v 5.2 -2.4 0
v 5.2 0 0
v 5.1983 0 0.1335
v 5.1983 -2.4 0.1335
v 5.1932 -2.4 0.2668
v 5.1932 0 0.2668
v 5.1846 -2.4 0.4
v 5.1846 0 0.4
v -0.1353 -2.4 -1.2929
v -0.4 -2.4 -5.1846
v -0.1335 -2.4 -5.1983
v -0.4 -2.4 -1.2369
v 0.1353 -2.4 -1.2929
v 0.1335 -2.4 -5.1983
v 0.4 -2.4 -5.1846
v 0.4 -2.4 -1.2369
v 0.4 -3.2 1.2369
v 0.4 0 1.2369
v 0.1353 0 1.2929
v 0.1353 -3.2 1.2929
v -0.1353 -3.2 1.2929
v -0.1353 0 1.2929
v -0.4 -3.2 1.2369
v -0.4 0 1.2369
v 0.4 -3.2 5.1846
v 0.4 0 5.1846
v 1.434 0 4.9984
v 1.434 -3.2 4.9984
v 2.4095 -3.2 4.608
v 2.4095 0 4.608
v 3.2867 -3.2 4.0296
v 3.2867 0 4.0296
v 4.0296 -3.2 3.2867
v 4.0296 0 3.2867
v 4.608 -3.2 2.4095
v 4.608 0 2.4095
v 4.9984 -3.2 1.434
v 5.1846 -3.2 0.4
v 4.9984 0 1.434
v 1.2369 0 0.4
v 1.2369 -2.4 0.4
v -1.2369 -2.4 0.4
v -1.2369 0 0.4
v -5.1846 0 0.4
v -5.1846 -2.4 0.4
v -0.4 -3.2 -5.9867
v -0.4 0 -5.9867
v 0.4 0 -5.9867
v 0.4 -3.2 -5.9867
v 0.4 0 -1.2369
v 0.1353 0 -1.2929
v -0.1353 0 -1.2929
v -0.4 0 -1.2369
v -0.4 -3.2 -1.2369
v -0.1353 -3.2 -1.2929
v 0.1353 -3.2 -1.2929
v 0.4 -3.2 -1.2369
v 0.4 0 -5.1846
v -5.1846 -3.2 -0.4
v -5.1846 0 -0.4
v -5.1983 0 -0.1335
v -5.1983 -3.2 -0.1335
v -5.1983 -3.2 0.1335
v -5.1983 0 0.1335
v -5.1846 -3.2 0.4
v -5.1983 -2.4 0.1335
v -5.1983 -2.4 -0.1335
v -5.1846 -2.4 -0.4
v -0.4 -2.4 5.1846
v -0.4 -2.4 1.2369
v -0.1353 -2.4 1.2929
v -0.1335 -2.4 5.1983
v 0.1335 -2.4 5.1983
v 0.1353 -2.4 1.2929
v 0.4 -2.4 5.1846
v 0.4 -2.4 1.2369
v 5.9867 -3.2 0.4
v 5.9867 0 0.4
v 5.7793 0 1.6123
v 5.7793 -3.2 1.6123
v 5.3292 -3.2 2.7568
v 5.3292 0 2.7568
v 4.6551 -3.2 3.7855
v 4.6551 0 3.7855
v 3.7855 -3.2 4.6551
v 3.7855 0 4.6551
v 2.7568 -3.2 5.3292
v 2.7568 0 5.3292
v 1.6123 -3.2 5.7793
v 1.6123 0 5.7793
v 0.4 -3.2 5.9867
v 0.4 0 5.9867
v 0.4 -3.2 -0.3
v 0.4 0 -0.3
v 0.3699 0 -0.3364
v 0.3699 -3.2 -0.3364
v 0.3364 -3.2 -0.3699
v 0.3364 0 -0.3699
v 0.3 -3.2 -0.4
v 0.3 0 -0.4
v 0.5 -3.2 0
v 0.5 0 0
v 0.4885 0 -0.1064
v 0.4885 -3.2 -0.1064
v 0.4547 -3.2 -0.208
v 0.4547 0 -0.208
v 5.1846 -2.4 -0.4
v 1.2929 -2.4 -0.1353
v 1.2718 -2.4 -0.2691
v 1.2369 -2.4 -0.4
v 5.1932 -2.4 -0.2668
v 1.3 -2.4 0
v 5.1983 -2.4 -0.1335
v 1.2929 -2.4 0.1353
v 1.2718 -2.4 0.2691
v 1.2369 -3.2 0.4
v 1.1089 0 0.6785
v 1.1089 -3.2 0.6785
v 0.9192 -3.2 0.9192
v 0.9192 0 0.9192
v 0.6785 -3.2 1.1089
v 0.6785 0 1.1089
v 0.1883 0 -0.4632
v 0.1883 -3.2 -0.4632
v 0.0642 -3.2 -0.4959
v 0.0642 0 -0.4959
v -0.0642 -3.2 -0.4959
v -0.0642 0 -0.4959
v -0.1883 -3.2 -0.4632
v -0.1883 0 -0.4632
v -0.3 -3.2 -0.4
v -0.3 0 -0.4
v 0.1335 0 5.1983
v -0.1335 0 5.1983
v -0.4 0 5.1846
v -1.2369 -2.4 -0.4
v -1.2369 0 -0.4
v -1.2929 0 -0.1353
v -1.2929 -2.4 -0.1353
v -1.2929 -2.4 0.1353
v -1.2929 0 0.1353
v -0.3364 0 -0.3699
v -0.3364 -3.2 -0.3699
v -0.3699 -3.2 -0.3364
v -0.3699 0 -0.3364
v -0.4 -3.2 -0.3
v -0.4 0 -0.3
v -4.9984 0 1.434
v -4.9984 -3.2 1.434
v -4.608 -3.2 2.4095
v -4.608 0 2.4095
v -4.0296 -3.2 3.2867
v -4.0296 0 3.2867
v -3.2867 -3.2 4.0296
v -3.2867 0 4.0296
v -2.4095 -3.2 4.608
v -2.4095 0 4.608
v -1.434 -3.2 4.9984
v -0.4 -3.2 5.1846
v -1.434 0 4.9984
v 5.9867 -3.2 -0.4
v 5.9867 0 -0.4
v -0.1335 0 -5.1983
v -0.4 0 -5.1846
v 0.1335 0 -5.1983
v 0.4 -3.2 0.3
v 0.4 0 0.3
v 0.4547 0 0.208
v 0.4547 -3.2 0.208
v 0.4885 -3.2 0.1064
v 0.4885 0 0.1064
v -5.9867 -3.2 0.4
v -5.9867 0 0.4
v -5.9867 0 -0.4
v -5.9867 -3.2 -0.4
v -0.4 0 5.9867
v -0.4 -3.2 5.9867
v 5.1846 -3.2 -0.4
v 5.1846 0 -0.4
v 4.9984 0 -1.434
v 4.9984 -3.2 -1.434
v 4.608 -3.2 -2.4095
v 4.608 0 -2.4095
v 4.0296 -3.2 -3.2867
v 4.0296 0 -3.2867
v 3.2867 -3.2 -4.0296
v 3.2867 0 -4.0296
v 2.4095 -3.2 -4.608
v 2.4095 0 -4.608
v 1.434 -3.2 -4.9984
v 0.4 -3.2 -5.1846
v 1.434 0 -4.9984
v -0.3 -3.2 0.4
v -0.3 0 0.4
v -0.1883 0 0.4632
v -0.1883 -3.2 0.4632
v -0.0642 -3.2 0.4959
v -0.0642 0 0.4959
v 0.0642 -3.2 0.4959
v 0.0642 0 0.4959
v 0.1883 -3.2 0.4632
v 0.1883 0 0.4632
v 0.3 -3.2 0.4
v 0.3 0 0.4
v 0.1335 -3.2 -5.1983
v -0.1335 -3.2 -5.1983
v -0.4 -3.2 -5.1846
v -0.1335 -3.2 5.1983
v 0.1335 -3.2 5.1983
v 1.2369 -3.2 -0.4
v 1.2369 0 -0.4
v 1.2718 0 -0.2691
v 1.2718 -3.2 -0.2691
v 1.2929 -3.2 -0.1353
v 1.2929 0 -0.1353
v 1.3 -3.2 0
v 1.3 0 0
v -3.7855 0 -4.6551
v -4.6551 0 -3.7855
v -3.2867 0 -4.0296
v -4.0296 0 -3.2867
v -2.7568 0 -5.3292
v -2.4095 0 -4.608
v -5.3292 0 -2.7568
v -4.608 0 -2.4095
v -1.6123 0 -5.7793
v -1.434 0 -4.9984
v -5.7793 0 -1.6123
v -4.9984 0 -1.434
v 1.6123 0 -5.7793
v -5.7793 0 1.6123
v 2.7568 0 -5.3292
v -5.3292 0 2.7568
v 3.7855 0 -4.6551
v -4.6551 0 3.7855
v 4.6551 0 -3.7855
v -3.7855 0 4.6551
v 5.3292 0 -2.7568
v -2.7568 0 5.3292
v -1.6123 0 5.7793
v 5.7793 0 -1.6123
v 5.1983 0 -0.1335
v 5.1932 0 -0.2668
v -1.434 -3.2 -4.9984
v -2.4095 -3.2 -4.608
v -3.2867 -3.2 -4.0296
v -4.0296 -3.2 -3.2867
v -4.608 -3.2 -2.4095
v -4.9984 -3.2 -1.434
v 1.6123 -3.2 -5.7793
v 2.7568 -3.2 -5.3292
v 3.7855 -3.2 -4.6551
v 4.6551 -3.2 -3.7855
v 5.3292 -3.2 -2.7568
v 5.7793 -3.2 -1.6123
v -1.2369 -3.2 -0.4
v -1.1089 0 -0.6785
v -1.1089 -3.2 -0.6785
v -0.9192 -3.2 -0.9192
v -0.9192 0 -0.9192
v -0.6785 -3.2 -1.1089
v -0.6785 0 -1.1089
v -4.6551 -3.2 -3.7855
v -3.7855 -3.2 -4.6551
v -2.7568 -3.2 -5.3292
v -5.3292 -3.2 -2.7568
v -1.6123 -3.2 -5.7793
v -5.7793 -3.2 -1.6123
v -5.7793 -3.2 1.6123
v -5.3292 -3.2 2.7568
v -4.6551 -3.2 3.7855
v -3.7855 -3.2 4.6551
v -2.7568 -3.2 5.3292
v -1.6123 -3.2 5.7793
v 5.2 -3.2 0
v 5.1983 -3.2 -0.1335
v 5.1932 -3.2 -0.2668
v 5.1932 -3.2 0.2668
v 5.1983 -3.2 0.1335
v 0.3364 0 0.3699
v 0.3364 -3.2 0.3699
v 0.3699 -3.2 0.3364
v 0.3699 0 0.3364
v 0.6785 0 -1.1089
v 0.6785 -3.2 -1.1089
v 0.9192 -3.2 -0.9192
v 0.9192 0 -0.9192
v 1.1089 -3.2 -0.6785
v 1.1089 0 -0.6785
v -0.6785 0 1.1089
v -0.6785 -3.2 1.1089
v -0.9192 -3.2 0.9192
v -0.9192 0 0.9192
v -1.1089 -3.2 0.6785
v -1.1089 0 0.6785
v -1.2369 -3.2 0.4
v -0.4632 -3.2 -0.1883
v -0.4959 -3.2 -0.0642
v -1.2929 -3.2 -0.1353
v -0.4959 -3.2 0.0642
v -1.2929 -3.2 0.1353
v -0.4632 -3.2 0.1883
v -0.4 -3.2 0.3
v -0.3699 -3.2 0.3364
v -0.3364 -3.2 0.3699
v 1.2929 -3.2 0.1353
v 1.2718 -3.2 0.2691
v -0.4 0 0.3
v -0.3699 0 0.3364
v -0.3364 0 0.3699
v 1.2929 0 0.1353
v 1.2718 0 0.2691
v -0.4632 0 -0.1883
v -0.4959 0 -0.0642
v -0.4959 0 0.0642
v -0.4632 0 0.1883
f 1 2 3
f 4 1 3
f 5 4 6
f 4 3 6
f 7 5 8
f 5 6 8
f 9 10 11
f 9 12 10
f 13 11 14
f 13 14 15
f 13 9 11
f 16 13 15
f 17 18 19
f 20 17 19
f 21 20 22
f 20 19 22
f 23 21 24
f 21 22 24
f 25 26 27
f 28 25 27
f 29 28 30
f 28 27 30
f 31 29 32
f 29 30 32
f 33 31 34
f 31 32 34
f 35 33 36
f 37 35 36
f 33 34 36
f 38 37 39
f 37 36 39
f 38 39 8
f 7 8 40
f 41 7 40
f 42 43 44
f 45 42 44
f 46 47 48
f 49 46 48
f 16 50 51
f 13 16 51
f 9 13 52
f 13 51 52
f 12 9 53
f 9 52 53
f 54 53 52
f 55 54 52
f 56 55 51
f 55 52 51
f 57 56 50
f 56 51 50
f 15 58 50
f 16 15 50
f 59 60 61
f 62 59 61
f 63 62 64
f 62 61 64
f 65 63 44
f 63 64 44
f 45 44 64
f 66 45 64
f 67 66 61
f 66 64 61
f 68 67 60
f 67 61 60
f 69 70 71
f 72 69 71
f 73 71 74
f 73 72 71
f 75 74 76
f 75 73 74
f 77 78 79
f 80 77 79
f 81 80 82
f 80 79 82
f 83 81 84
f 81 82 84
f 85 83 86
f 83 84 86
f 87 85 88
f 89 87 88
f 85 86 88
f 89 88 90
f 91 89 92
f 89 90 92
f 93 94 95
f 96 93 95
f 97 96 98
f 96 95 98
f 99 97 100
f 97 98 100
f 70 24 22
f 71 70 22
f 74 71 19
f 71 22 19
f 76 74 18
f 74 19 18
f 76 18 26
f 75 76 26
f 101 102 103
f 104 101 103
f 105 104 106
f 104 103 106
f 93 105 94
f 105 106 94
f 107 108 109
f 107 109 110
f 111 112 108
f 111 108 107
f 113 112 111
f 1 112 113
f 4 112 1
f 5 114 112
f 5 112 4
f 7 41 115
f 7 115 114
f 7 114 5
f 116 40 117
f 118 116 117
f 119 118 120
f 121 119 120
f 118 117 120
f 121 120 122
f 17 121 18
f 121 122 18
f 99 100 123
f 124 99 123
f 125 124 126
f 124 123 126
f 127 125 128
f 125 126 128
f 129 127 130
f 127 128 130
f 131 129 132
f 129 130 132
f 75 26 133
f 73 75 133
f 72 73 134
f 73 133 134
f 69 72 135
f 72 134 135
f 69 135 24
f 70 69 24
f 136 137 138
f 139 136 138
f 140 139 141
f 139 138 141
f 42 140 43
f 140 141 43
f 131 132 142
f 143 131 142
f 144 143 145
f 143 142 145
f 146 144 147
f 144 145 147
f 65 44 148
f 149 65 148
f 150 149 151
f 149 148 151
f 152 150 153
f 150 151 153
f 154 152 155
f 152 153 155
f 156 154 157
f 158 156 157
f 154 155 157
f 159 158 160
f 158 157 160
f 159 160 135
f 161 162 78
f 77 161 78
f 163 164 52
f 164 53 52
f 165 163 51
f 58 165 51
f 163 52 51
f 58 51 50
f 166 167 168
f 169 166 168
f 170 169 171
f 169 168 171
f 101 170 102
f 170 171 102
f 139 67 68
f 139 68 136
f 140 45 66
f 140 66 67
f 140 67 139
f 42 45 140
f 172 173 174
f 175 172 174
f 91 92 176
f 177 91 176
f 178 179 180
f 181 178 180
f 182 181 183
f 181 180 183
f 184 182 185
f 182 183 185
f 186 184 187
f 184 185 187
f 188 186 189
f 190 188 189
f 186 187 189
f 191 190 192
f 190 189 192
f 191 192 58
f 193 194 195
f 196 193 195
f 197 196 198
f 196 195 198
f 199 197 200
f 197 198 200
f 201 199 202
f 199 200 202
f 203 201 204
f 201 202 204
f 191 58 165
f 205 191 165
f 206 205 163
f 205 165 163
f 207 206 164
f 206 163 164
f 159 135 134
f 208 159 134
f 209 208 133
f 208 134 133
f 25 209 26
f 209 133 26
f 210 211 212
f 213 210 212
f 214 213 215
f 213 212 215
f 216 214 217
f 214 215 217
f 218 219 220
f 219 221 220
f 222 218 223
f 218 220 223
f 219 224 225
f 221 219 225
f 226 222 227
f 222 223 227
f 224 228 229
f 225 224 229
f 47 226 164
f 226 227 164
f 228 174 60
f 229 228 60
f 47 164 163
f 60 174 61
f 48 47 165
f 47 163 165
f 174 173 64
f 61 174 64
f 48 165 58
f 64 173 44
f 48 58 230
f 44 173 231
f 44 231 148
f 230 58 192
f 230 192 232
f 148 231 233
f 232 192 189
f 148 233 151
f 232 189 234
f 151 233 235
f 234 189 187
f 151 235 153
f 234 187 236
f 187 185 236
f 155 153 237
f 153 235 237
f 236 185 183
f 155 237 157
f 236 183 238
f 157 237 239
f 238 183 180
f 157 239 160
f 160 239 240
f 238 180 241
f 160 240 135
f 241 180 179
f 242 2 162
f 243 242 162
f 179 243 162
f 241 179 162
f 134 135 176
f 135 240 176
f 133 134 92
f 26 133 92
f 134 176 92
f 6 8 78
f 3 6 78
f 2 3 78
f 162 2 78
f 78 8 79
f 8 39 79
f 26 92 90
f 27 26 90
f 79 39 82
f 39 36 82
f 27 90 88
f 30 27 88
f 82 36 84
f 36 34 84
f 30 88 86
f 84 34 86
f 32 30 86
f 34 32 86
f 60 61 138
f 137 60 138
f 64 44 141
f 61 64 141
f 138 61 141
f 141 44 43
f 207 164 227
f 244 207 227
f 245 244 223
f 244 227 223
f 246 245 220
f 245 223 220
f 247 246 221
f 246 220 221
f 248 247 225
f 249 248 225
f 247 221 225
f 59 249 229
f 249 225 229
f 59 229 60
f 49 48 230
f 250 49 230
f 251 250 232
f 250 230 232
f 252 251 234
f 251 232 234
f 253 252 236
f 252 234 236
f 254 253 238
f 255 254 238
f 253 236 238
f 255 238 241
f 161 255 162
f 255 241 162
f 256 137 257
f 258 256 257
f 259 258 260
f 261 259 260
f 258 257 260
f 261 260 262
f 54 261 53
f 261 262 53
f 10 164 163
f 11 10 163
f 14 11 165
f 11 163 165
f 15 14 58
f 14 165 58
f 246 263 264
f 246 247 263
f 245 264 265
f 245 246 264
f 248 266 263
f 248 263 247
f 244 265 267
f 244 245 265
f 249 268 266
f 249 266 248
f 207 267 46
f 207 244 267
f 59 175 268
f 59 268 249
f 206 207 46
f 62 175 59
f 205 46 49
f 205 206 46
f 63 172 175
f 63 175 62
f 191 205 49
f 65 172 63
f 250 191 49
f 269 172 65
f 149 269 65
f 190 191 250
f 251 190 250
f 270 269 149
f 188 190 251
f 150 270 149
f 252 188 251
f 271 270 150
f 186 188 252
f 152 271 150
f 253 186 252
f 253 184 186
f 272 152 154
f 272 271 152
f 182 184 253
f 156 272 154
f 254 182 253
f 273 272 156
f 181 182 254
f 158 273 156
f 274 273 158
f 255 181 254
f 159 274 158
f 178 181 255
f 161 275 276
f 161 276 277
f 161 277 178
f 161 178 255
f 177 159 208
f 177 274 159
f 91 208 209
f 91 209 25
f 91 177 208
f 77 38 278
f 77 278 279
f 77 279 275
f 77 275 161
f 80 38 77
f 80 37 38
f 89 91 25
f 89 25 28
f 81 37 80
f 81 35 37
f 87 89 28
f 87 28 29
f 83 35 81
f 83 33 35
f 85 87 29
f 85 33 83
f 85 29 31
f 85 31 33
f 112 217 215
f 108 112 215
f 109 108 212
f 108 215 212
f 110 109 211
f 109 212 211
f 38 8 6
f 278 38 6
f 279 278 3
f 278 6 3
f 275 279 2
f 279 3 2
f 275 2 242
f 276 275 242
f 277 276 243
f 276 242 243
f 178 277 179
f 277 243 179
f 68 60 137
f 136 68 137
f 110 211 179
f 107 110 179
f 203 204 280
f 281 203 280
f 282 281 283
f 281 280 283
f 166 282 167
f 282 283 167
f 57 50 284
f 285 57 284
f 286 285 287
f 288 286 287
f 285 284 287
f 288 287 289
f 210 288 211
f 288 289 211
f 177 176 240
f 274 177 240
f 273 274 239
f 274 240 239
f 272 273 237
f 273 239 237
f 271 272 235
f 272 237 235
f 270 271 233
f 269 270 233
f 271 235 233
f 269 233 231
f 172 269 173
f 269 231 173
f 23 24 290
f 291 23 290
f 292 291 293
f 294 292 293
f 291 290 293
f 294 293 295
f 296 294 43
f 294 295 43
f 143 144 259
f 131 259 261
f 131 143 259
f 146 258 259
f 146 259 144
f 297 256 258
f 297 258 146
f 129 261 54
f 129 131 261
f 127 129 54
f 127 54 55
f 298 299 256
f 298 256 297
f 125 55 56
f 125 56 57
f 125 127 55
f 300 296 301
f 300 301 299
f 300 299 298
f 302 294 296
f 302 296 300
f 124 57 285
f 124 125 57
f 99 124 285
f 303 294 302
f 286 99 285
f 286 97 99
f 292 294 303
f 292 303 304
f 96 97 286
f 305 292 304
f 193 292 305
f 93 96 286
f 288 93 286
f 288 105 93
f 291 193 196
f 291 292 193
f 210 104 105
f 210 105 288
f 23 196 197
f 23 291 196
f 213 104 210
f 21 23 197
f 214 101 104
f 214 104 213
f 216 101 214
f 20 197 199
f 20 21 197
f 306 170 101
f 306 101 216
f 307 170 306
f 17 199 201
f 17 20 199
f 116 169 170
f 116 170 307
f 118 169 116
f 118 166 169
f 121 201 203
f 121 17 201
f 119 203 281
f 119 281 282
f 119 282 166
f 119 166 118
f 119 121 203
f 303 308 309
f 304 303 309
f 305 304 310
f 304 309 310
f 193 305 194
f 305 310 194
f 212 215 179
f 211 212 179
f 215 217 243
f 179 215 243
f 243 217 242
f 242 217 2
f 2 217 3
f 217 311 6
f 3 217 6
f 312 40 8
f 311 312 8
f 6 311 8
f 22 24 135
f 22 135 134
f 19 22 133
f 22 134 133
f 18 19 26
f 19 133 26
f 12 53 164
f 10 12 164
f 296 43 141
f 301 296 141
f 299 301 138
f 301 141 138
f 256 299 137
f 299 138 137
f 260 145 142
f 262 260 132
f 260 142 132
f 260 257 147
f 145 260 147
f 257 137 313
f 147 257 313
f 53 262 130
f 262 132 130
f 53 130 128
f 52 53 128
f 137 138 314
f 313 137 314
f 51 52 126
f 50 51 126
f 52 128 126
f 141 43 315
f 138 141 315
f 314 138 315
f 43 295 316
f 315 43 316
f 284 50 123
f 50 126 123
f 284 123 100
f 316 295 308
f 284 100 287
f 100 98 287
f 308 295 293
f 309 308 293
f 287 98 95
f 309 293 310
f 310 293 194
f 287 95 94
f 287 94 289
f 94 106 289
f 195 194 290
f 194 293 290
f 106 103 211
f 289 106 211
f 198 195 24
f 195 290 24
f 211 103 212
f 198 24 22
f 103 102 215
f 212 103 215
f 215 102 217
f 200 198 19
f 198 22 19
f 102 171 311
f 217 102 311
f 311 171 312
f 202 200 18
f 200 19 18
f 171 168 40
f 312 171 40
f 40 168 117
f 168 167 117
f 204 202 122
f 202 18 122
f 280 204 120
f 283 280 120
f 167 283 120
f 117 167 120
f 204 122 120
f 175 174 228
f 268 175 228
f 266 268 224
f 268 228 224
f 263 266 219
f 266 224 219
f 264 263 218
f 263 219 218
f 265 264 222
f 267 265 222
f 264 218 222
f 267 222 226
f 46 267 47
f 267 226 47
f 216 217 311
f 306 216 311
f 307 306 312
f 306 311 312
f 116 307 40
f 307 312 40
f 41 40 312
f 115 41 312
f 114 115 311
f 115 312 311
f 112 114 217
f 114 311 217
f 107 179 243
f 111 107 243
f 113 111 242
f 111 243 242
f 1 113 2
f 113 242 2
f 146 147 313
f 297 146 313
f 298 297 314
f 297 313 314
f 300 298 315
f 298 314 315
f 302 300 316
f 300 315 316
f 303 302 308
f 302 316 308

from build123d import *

# Parameters (mm, degrees)
F1_DEPTH = 3.2
F2_DEPTH = 2.4


with BuildPart() as f1:
    # F0 (on Front) → F1 (new body)
    with BuildSketch(Plane.XZ):
        with BuildLine():
            Line((-0.4, 5.1845925587), (-0.4, 5.9866518188))
            ThreePointArc((-0.4, 5.9866518188), (-4.2426406871, 4.2426406871), (-5.9866518188, 0.4))
            Line((-5.9866518188, 0.4), (-5.1845925587, 0.4))
            ThreePointArc((-5.1845925587, 0.4), (-3.6769552622, 3.6769552622), (-0.4, 5.1845925587))
        make_face()
        with BuildLine():
            Line((0.4, 5.1845925587), (0.4, 5.9866518188))
            Line((0.4, 5.9866518188), (-0.4, 5.9866518188))
            Line((-0.4, 5.9866518188), (-0.4, 5.1845925587))
            ThreePointArc((-0.4, 5.1845925587), (0, 5.2), (0.4, 5.1845925587))
        make_face()
        with BuildLine():
            Line((5.1845925587, 0.4), (5.9866518188, 0.4))
            ThreePointArc((5.9866518188, 0.4), (4.2426406871, 4.2426406871), (0.4, 5.9866518188))
            Line((0.4, 5.9866518188), (0.4, 5.1845925587))
            ThreePointArc((0.4, 5.1845925587), (3.6769552622, 3.6769552622), (5.1845925587, 0.4))
        make_face()
        with BuildLine():
            Line((5.9866518188, -0.4), (5.9866518188, 0.4))
            Line((5.9866518188, 0.4), (5.1845925587, 0.4))
            ThreePointArc((5.1845925587, 0.4), (5.196146712, 0.2001483133), (5.2, 0))
            ThreePointArc((5.2, 0), (5.196146712, -0.2001483133), (5.1845925587, -0.4))
            Line((5.1845925587, -0.4), (5.9866518188, -0.4))
        make_face()
        with BuildLine():
            ThreePointArc((0.4, -5.9866518188), (4.2426406871, -4.2426406871), (5.9866518188, -0.4))
            Line((5.9866518188, -0.4), (5.1845925587, -0.4))
            ThreePointArc((5.1845925587, -0.4), (3.6769552622, -3.6769552622), (0.4, -5.1845925587))
            Line((0.4, -5.1845925587), (0.4, -5.9866518188))
        make_face()
        with BuildLine():
            Line((-0.4, -5.9866518188), (0.4, -5.9866518188))
            Line((0.4, -5.9866518188), (0.4, -5.1845925587))
            ThreePointArc((0.4, -5.1845925587), (0, -5.2), (-0.4, -5.1845925587))
            Line((-0.4, -5.1845925587), (-0.4, -5.9866518188))
        make_face()
        with BuildLine():
            ThreePointArc((-5.9866518188, -0.4), (-4.2426406871, -4.2426406871), (-0.4, -5.9866518188))
            Line((-0.4, -5.9866518188), (-0.4, -5.1845925587))
            ThreePointArc((-0.4, -5.1845925587), (-3.6769552622, -3.6769552622), (-5.1845925587, -0.4))
            Line((-5.1845925587, -0.4), (-5.9866518188, -0.4))
        make_face()
        with BuildLine():
            Line((-5.1845925587, 0.4), (-5.9866518188, 0.4))
            Line((-5.9866518188, 0.4), (-5.9866518188, -0.4))
            Line((-5.9866518188, -0.4), (-5.1845925587, -0.4))
            ThreePointArc((-5.1845925587, -0.4), (-5.2, 0), (-5.1845925587, 0.4))
        make_face()
    extrude(amount=F1_DEPTH)


with BuildPart() as f1b:
    # F0 (on Front) → F1, piece 2 (new body)
    with BuildSketch(Plane.XZ):
        with BuildLine():
            Line((-0.4, 0.4), (-0.4, 1.2369316877))
            ThreePointArc((-0.4, 1.2369316877), (-0.9192388155, 0.9192388155), (-1.2369316877, 0.4))
            Line((-1.2369316877, 0.4), (-0.4, 0.4))
        make_face()
        with BuildLine():
            Line((0.4, 0.4), (0.4, 1.2369316877))
            ThreePointArc((0.4, 1.2369316877), (0, 1.3), (-0.4, 1.2369316877))
            Line((-0.4, 1.2369316877), (-0.4, 0.4))
            Line((-0.4, 0.4), (-0.3, 0.4))
            ThreePointArc((-0.3, 0.4), (0, 0.5), (0.3, 0.4))
            Line((0.3, 0.4), (0.4, 0.4))
        make_face()
        with BuildLine():
            Line((0.4, 0.4), (1.2369316877, 0.4))
            ThreePointArc((1.2369316877, 0.4), (0.9192388155, 0.9192388155), (0.4, 1.2369316877))
            Line((0.4, 1.2369316877), (0.4, 0.4))
        make_face()
        with BuildLine():
            ThreePointArc((1.3, 0), (1.2841361287, 0.202470746), (1.2369316877, 0.4))
            Line((1.2369316877, 0.4), (0.4, 0.4))
            Line((0.4, 0.4), (0.4, 0.3))
            ThreePointArc((0.4, 0.3), (0.474341649, 0.158113883), (0.5, 0))
            ThreePointArc((0.5, 0), (0.474341649, -0.158113883), (0.4, -0.3))
            Line((0.4, -0.3), (0.4, -0.4))
            Line((0.4, -0.4), (1.2369316877, -0.4))
            ThreePointArc((1.2369316877, -0.4), (1.2841361287, -0.202470746), (1.3, 0))
        make_face()
        with BuildLine():
            ThreePointArc((0.4, -1.2369316877), (0.9192388155, -0.9192388155), (1.2369316877, -0.4))
            Line((1.2369316877, -0.4), (0.4, -0.4))
            Line((0.4, -0.4), (0.4, -1.2369316877))
        make_face()
        with BuildLine():
            ThreePointArc((-0.4, -1.2369316877), (0, -1.3), (0.4, -1.2369316877))
            Line((0.4, -1.2369316877), (0.4, -0.4))
            Line((0.4, -0.4), (0.3, -0.4))
            ThreePointArc((0.3, -0.4), (0, -0.5), (-0.3, -0.4))
            Line((-0.3, -0.4), (-0.4, -0.4))
            Line((-0.4, -0.4), (-0.4, -1.2369316877))
        make_face()
        with BuildLine():
            ThreePointArc((-1.2369316877, -0.4), (-0.9192388155, -0.9192388155), (-0.4, -1.2369316877))
            Line((-0.4, -1.2369316877), (-0.4, -0.4))
            Line((-0.4, -0.4), (-1.2369316877, -0.4))
        make_face()
        with BuildLine():
            Line((-0.4, 0.4), (-1.2369316877, 0.4))
            ThreePointArc((-1.2369316877, 0.4), (-1.3, 0), (-1.2369316877, -0.4))
            Line((-1.2369316877, -0.4), (-0.4, -0.4))
            Line((-0.4, -0.4), (-0.4, -0.3))
            ThreePointArc((-0.4, -0.3), (-0.5, 0), (-0.4, 0.3))
            Line((-0.4, 0.3), (-0.4, 0.4))
        make_face()
        with BuildLine():
            Line((-0.3, 0.4), (-0.4, 0.4))
            Line((-0.4, 0.4), (-0.4, 0.3))
            ThreePointArc((-0.4, 0.3), (-0.3535533906, 0.3535533906), (-0.3, 0.4))
        make_face()
        with BuildLine():
            Line((0.4, 0.3), (0.4, 0.4))
            Line((0.4, 0.4), (0.3, 0.4))
            ThreePointArc((0.3, 0.4), (0.3535533906, 0.3535533906), (0.4, 0.3))
        make_face()
        with BuildLine():
            Line((0.3, -0.4), (0.4, -0.4))
            Line((0.4, -0.4), (0.4, -0.3))
            ThreePointArc((0.4, -0.3), (0.3535533906, -0.3535533906), (0.3, -0.4))
        make_face()
        with BuildLine():
            Line((-0.4, -0.3), (-0.4, -0.4))
            Line((-0.4, -0.4), (-0.3, -0.4))
            ThreePointArc((-0.3, -0.4), (-0.3535533906, -0.3535533906), (-0.4, -0.3))
        make_face()
    extrude(amount=F1_DEPTH)


with BuildPart() as f2:
    # F0 (on Front) → F2 (new body)
    with BuildSketch(Plane.XZ):
        with BuildLine():
            Line((-1.2369316877, 0.4), (-5.1845925587, 0.4))
            ThreePointArc((-5.1845925587, 0.4), (-5.2, 0), (-5.1845925587, -0.4))
            Line((-5.1845925587, -0.4), (-1.2369316877, -0.4))
            ThreePointArc((-1.2369316877, -0.4), (-1.3, 0), (-1.2369316877, 0.4))
        make_face()
    extrude(amount=F2_DEPTH)


with BuildPart() as f2b:
    # F0 (on Front) → F2, piece 2 (new body)
    with BuildSketch(Plane.XZ):
        with BuildLine():
            Line((0.4, 1.2369316877), (0.4, 5.1845925587))
            ThreePointArc((0.4, 5.1845925587), (0, 5.2), (-0.4, 5.1845925587))
            Line((-0.4, 5.1845925587), (-0.4, 1.2369316877))
            ThreePointArc((-0.4, 1.2369316877), (0, 1.3), (0.4, 1.2369316877))
        make_face()
    extrude(amount=F2_DEPTH)


with BuildPart() as f2c:
    # F0 (on Front) → F2, piece 3 (new body)
    with BuildSketch(Plane.XZ):
        with BuildLine():
            ThreePointArc((5.2, 0), (5.196146712, 0.2001483133), (5.1845925587, 0.4))
            Line((5.1845925587, 0.4), (1.2369316877, 0.4))
            ThreePointArc((1.2369316877, 0.4), (1.2841361287, 0.202470746), (1.3, 0))
            ThreePointArc((1.3, 0), (1.2841361287, -0.202470746), (1.2369316877, -0.4))
            Line((1.2369316877, -0.4), (5.1845925587, -0.4))
            ThreePointArc((5.1845925587, -0.4), (5.196146712, -0.2001483133), (5.2, 0))
        make_face()
    extrude(amount=F2_DEPTH)


with BuildPart() as f2d:
    # F0 (on Front) → F2, piece 4 (new body)
    with BuildSketch(Plane.XZ):
        with BuildLine():
            ThreePointArc((-0.4, -5.1845925587), (0, -5.2), (0.4, -5.1845925587))
            Line((0.4, -5.1845925587), (0.4, -1.2369316877))
            ThreePointArc((0.4, -1.2369316877), (0, -1.3), (-0.4, -1.2369316877))
            Line((-0.4, -1.2369316877), (-0.4, -5.1845925587))
        make_face()
    extrude(amount=F2_DEPTH)


solid = Compound([f1.part, f1b.part, f2.part, f2b.part, f2c.part, f2d.part])
